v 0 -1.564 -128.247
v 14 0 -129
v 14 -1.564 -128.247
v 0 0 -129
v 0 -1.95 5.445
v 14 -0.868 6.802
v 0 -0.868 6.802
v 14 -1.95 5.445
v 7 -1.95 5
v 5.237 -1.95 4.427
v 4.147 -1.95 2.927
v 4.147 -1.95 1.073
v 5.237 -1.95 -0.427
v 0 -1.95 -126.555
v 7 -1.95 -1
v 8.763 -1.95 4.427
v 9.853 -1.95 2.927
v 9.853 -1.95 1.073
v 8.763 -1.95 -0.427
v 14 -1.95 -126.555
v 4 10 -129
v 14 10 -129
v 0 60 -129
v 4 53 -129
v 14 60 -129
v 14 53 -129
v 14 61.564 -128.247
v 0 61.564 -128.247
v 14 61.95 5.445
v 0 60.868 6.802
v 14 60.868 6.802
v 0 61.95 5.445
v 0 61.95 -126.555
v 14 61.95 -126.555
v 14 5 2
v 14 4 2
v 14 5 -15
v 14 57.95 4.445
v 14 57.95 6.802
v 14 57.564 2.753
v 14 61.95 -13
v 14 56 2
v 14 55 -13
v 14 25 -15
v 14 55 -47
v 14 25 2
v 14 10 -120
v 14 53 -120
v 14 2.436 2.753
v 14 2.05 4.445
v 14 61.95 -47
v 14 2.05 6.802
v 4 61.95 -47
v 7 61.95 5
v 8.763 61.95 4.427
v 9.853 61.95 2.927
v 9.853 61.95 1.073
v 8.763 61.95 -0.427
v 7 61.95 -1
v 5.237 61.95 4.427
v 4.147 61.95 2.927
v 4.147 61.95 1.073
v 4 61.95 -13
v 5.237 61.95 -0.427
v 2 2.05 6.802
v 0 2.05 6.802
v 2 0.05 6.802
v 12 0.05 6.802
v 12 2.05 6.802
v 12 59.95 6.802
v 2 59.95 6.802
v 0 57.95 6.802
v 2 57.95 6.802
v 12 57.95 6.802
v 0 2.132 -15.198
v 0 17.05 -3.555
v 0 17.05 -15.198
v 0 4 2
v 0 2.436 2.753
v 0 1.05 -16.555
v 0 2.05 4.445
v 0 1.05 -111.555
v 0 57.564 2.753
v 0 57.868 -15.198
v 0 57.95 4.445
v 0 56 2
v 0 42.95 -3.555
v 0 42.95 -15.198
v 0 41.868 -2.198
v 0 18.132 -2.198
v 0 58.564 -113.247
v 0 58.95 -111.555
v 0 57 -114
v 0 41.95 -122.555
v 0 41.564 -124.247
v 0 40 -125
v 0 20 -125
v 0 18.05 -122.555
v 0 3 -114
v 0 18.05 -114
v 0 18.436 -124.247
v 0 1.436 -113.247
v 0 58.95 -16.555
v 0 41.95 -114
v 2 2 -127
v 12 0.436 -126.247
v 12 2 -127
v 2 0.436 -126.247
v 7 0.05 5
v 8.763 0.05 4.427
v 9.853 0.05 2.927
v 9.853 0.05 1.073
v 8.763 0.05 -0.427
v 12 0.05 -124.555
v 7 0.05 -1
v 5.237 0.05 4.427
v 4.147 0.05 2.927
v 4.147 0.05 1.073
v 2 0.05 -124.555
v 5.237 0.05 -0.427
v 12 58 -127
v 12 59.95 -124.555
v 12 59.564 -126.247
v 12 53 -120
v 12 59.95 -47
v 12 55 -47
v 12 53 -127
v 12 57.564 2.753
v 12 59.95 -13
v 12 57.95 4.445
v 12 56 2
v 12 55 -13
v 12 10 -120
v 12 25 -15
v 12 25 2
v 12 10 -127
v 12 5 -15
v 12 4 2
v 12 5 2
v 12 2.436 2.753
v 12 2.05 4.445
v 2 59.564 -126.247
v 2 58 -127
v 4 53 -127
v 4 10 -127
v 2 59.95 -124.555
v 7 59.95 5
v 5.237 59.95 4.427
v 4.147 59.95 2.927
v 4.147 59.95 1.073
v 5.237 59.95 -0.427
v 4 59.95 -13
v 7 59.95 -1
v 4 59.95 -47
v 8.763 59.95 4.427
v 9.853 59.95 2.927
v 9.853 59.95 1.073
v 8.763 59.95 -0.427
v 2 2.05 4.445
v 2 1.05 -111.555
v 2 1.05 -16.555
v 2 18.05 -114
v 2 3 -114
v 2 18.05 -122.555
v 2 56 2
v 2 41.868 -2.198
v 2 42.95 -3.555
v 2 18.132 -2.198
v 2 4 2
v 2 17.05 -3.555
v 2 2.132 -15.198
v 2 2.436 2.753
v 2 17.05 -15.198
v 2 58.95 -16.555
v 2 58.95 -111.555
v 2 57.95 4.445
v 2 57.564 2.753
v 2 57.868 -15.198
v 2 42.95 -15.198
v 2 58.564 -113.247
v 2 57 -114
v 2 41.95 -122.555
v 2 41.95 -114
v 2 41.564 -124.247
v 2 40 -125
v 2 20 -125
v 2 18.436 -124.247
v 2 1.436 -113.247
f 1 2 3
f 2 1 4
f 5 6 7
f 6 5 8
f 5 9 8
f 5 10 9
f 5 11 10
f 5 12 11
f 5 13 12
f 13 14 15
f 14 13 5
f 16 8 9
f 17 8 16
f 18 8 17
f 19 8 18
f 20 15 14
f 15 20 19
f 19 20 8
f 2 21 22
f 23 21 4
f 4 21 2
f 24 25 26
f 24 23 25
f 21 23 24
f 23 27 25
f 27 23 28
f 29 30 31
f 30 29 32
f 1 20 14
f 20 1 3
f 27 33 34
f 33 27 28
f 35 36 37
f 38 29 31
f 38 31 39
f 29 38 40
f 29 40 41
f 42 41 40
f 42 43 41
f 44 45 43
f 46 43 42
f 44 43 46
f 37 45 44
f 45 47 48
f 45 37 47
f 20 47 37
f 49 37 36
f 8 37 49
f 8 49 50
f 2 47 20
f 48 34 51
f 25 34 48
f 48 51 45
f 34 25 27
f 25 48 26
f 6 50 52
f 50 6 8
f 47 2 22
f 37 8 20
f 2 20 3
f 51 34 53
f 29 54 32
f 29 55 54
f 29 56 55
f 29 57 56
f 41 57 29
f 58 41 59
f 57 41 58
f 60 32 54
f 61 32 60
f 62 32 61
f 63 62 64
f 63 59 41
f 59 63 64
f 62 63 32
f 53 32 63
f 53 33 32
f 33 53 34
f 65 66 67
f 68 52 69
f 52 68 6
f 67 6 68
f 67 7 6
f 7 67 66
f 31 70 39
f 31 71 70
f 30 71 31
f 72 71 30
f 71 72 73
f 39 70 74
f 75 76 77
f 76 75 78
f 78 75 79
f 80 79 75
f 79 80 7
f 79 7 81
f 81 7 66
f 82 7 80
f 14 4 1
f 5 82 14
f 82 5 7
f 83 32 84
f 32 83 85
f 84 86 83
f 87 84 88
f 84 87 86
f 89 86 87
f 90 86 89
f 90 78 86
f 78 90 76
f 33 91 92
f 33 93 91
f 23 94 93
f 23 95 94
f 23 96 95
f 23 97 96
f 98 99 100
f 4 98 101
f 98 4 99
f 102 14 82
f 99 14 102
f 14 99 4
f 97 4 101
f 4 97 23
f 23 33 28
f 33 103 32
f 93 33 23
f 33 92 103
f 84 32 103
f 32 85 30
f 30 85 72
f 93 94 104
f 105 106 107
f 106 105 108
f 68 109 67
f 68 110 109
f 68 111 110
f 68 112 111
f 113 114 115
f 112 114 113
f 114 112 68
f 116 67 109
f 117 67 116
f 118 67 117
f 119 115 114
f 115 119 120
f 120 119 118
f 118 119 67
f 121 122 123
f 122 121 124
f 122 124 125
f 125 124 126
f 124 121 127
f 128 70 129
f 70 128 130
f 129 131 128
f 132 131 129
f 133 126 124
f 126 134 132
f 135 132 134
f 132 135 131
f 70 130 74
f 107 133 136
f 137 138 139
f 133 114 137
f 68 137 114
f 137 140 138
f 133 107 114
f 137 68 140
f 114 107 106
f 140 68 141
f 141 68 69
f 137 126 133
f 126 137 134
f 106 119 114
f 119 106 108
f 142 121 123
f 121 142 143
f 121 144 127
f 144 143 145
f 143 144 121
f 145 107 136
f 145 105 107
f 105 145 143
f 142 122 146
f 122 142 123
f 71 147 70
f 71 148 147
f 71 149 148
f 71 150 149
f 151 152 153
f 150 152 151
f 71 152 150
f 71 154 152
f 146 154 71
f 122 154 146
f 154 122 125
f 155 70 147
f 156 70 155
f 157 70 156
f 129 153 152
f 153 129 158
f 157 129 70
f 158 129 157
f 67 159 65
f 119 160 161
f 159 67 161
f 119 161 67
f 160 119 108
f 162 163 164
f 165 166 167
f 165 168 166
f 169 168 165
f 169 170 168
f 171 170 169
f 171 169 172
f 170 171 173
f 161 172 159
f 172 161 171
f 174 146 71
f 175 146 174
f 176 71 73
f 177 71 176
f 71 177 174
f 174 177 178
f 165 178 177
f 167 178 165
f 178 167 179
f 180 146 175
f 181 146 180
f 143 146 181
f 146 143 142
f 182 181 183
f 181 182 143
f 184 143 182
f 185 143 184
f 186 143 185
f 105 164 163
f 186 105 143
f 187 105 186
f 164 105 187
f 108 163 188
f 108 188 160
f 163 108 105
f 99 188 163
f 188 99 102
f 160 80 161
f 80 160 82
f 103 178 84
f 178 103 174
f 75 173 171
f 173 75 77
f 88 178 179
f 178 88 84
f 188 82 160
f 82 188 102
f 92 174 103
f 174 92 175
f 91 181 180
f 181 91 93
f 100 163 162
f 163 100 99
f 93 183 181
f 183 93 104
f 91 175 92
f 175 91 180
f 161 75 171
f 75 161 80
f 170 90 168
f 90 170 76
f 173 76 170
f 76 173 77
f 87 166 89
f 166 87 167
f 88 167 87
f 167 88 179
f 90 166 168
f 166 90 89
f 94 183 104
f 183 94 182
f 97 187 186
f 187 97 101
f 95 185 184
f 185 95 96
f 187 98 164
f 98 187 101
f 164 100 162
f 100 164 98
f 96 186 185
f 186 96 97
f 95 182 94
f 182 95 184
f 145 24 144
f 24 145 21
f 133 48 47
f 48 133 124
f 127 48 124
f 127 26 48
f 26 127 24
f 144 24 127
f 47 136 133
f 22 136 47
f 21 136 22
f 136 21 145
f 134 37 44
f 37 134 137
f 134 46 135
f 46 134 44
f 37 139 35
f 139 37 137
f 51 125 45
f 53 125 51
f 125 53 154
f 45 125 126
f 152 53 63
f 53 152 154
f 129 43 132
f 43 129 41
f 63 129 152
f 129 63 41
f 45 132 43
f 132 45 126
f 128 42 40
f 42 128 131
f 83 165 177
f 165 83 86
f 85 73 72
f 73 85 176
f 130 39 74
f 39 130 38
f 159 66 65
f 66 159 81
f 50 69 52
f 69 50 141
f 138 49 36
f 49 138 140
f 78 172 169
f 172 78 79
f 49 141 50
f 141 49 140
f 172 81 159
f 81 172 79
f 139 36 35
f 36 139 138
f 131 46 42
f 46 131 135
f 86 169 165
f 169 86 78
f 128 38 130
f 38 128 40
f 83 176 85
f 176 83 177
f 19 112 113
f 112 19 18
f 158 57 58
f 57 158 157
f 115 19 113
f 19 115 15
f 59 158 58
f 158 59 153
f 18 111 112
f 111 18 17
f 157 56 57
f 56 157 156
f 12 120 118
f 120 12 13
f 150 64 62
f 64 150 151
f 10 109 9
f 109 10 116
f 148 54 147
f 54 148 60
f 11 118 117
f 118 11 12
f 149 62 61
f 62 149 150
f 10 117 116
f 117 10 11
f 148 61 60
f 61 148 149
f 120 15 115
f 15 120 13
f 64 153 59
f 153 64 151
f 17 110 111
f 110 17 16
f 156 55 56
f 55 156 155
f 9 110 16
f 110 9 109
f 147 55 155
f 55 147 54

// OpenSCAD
rotate([0,90,0]){ // rotate on printing bed.
difference(){

translate([-5,0,0]){
minkowski() {
cube([132,60,12]);  // Brick
			cylinder(r=2,h=2);}}

translate([-15,2,2]){
minkowski() {
cube([140,56,8]);  // iphone5 cut out
			cylinder(r=2,h=2);}}

translate([17,3,-5]){
minkowski() {
cube([95,54,6]);  // screen cut out
			cylinder(r=2,h=2);}}

translate([4,19,-5]){
minkowski() {
cube([50,22,6]);  // front camera cut out
			cylinder(r=2,h=2);}}

translate([73,20,-15]){
minkowski() {
cube([50,20,20]);  // button cut out
			cylinder(r=2,h=2);}}

translate([120,10,4]){
cube([41,43,20]);} // Speaker cut out


translate([-35,5,4]){
cube([50,20,20]);} // Power cut out


translate([13,55,4]){
cube([34,20,20]);} // Volume cut out

translate([-34,4,-12]){
minkowski() {
cube([30,52,30]);  // rail cut out
			cylinder(r=2,h=2);}}


translate([-2,70,7]){
rotate([90,0,0]){		// Bolt Hole
			cylinder(r=3,h=90);}}

}}
